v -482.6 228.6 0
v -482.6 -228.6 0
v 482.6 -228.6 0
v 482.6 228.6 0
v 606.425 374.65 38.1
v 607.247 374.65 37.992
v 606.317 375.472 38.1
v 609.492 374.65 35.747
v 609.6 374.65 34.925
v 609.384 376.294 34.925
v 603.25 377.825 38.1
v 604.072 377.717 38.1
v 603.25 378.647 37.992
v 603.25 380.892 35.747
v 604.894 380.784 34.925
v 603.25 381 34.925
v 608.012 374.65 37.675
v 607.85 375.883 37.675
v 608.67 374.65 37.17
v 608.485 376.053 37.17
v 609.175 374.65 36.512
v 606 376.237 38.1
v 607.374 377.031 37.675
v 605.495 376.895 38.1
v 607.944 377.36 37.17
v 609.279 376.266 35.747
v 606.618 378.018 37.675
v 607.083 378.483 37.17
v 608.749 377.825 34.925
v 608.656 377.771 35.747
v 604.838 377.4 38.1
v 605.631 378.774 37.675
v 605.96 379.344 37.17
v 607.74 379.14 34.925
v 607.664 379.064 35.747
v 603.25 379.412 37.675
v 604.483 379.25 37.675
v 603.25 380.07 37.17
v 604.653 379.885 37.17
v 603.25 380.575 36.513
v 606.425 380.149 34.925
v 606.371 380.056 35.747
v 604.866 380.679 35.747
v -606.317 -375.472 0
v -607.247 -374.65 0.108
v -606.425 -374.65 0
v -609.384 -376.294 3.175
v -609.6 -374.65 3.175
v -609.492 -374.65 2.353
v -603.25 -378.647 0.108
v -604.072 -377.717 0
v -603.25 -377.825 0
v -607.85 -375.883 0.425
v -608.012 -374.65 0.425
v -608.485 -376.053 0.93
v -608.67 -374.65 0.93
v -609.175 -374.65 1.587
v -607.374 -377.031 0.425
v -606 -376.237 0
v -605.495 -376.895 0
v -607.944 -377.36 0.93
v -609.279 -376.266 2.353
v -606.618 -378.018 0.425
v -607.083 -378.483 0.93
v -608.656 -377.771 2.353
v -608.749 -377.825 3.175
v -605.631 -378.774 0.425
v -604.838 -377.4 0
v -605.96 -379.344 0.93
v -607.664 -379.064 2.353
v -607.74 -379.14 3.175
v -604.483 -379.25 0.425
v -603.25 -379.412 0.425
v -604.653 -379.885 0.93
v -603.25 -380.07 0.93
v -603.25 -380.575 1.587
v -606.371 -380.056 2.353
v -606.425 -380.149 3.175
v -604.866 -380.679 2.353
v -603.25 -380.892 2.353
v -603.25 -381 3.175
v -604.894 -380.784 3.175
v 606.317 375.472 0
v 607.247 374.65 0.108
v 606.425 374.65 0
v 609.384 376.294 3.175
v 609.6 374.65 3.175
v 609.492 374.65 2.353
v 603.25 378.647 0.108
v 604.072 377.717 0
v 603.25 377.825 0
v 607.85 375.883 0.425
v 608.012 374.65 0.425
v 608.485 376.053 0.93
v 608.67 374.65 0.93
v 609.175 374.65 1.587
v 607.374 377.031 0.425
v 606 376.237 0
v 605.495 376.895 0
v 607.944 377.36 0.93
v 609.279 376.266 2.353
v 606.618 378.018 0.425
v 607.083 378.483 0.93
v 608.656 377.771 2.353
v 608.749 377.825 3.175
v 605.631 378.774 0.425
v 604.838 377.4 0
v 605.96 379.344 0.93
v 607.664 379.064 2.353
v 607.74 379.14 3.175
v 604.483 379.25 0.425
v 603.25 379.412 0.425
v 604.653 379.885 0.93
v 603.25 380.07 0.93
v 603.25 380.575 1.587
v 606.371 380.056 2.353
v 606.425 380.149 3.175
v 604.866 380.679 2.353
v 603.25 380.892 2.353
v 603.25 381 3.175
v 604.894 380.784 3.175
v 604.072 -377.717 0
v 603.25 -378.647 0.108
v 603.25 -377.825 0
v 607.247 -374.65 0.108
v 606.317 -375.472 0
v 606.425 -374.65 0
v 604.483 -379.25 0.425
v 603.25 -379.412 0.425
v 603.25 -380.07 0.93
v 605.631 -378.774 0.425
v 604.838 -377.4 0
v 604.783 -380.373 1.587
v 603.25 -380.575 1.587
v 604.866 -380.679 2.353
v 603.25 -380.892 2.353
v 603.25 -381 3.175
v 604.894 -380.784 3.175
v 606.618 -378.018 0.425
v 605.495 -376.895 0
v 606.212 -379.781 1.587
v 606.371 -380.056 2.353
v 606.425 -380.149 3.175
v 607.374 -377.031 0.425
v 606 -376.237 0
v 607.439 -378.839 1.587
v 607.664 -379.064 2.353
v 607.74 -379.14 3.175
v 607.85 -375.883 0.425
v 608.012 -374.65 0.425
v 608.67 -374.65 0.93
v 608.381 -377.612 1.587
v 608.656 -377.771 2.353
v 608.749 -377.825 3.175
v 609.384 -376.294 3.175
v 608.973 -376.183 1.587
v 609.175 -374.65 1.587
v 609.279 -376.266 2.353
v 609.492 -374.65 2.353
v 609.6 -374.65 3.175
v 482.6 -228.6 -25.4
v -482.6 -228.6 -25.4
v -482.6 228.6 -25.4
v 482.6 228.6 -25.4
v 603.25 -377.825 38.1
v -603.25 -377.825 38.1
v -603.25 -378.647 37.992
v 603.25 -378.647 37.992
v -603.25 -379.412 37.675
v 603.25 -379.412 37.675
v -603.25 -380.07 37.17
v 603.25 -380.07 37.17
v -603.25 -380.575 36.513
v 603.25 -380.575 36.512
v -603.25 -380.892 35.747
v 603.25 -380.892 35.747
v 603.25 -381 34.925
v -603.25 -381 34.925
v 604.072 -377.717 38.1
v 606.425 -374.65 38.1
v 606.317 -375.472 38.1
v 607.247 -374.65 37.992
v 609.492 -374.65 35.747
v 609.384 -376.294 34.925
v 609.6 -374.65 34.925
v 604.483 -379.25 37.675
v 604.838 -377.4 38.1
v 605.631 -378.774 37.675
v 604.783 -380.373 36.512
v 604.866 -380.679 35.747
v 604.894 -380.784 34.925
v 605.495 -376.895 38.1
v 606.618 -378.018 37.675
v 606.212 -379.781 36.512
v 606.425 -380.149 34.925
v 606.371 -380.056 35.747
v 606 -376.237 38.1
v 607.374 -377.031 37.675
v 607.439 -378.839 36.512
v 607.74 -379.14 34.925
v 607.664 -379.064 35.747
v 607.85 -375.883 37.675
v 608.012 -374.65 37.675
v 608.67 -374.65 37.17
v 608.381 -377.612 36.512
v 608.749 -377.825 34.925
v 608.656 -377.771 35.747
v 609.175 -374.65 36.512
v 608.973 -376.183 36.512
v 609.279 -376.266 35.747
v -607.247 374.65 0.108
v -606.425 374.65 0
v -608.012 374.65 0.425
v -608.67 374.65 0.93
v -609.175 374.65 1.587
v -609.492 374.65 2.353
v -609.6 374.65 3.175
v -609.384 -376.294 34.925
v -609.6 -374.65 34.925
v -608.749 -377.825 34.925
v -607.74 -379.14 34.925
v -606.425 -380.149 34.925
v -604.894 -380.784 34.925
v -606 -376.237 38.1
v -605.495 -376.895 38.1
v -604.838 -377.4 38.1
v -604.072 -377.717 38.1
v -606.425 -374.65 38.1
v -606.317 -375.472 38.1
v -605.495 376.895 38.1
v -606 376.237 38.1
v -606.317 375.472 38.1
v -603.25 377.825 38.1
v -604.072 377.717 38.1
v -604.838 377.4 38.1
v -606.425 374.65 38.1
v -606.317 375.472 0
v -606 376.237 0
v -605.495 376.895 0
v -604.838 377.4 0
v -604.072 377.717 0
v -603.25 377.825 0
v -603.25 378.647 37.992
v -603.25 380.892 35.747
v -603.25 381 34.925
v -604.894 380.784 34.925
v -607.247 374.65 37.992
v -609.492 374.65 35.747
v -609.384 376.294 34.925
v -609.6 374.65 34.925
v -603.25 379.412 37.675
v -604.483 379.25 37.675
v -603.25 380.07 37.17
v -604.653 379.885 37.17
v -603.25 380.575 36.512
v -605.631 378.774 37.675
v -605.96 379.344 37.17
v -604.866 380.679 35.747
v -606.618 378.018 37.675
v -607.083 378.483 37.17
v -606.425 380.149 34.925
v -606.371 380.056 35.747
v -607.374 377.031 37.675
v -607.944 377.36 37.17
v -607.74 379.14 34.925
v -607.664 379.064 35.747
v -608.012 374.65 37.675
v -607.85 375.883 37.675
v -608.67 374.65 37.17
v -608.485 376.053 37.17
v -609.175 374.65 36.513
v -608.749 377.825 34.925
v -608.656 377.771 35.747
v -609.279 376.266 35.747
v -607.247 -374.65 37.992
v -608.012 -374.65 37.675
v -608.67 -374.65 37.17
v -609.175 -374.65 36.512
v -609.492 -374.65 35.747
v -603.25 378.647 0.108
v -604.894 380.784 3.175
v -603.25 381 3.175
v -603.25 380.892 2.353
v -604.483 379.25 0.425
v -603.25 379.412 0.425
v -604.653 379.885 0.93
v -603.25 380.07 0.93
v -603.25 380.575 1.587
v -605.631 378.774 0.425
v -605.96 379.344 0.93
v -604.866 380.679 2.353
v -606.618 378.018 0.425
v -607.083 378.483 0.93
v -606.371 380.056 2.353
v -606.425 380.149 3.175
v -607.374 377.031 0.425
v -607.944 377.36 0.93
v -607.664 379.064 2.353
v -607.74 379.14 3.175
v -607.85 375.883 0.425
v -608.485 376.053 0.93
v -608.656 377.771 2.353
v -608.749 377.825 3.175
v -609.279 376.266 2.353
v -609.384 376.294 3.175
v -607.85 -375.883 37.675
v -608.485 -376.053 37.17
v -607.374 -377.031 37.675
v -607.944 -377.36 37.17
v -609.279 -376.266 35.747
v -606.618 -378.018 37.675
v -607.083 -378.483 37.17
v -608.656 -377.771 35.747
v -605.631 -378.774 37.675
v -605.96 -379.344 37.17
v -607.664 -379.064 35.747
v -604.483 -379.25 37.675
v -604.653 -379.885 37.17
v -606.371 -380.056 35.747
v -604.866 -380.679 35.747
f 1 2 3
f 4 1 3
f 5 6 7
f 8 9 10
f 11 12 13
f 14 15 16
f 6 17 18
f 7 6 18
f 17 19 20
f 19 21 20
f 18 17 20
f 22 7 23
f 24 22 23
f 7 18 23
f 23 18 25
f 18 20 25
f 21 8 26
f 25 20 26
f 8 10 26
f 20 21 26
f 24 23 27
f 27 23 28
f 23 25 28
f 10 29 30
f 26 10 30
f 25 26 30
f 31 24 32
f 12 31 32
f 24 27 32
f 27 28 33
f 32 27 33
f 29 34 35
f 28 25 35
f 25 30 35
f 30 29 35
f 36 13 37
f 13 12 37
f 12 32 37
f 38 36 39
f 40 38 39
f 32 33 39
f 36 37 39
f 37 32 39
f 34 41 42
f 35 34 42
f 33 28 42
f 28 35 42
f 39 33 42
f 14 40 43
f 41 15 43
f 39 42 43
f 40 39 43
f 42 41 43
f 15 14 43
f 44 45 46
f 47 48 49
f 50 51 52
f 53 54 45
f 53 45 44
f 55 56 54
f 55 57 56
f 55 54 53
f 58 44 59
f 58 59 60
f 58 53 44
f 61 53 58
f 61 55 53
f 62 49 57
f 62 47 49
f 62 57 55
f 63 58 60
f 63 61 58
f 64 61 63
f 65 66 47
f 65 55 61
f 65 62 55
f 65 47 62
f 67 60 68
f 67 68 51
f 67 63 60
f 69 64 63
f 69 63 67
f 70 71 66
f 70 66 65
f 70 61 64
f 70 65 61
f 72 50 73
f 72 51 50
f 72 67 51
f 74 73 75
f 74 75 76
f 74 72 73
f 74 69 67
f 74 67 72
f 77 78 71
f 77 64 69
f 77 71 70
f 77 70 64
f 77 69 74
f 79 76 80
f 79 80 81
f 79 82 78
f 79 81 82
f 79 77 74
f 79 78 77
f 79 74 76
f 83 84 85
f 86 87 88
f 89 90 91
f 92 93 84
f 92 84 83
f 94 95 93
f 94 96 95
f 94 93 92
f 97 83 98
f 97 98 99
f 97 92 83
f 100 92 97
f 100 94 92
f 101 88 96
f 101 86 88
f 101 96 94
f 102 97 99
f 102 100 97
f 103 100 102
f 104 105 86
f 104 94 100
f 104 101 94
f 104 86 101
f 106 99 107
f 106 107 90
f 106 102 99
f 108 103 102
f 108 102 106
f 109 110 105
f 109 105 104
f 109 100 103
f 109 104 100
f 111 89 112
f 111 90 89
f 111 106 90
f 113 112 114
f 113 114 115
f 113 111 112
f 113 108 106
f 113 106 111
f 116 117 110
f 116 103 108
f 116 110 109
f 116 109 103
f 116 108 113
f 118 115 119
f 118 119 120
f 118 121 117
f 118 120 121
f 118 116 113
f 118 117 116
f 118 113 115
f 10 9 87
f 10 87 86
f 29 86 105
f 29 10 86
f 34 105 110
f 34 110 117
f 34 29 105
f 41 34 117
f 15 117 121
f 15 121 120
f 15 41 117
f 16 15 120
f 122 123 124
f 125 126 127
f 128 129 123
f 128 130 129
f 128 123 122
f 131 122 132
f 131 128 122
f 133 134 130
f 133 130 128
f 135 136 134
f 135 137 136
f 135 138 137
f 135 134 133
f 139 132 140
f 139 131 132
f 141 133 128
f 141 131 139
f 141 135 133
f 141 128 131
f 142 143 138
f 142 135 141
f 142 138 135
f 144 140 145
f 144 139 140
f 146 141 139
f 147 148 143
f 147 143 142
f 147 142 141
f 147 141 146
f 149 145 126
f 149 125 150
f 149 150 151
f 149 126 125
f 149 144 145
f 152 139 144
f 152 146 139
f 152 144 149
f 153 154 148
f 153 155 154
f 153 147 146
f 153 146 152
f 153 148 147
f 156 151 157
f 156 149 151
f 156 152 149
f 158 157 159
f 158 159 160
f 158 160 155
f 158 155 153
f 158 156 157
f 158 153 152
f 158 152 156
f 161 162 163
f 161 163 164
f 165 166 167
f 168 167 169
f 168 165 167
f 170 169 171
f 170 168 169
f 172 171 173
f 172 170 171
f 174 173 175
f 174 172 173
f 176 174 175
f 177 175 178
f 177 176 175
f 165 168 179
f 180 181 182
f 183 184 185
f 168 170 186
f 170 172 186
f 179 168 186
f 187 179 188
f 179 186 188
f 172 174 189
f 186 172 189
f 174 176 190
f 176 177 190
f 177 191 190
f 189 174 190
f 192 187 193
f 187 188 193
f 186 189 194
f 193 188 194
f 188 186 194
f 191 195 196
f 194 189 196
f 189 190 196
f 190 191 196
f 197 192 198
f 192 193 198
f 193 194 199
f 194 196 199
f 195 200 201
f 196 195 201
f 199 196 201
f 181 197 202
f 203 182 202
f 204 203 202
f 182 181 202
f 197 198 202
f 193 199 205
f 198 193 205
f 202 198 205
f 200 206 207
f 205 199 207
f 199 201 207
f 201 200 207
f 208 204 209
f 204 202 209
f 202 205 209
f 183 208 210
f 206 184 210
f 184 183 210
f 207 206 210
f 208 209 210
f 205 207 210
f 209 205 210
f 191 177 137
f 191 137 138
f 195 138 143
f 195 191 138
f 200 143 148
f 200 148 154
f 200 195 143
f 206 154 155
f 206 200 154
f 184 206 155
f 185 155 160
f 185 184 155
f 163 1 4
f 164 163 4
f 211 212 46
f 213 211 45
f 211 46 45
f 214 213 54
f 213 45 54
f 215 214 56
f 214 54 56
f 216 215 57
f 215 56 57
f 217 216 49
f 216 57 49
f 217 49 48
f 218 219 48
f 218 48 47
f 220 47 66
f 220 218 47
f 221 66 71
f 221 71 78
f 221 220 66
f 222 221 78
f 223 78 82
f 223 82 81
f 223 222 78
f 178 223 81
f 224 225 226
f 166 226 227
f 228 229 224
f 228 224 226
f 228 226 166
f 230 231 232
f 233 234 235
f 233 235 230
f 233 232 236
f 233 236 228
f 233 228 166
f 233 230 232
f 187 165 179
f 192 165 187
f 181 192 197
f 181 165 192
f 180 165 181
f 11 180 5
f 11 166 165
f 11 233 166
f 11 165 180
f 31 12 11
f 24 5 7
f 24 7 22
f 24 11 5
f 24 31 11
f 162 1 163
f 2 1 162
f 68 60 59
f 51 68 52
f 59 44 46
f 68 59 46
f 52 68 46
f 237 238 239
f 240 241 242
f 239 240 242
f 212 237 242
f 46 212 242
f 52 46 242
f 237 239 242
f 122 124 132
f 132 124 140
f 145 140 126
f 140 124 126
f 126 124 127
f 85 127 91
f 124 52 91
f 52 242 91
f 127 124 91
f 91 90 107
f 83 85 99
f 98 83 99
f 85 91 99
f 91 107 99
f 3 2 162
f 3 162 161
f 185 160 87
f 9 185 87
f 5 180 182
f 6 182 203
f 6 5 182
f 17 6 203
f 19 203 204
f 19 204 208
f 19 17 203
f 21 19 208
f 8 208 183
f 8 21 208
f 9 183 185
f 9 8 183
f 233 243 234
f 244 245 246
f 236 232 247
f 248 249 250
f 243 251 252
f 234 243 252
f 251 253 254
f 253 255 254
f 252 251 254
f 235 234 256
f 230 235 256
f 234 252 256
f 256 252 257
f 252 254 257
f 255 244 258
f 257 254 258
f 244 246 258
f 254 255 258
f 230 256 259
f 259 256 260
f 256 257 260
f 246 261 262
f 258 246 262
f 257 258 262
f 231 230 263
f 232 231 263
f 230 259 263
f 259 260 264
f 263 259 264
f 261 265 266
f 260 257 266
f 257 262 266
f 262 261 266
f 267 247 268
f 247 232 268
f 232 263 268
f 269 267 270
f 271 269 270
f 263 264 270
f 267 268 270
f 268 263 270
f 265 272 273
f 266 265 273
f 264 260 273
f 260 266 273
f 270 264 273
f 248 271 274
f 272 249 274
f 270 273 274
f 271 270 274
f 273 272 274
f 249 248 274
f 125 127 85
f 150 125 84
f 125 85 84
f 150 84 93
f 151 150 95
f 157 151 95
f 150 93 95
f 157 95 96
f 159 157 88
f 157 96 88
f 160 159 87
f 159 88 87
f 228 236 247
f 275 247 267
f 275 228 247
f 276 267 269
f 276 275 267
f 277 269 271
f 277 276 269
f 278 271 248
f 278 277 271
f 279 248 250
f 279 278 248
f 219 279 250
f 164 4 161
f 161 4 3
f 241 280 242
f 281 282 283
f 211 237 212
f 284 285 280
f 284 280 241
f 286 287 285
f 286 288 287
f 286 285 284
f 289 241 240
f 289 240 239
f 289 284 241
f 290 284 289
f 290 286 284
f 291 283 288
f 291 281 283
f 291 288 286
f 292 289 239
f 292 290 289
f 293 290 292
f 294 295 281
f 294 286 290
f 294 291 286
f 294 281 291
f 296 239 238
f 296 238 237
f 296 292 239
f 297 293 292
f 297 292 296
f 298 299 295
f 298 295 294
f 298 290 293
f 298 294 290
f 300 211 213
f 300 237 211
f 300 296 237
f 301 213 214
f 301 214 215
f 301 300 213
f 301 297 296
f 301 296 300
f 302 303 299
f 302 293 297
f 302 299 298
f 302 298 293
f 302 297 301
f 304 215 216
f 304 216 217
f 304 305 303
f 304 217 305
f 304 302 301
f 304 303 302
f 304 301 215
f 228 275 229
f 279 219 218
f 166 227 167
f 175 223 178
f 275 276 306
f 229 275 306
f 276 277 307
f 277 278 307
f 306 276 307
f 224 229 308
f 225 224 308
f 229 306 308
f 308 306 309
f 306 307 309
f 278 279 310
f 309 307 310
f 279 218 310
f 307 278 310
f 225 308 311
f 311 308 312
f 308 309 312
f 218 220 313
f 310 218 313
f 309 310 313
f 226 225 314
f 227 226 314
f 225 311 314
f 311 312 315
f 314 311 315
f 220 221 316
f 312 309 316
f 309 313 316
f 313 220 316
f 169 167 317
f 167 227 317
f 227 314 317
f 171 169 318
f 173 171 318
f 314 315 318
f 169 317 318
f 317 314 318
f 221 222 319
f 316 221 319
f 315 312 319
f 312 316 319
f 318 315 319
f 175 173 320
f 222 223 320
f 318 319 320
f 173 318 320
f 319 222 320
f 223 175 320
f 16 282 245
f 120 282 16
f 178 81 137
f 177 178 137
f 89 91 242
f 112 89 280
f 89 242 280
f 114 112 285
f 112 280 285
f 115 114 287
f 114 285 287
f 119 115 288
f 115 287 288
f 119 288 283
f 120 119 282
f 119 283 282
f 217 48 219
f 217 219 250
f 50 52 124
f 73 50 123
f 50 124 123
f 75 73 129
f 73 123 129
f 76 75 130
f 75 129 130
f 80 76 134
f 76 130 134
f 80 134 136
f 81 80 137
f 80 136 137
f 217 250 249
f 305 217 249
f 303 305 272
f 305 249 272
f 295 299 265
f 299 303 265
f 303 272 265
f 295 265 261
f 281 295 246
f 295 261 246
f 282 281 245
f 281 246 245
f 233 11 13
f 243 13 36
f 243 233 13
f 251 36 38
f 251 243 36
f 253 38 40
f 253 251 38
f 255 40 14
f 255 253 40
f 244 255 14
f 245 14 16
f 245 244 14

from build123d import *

# Parameters (mm, degrees)
F0_W     = 1219.2
F0_H     = 762
F1_DEPTH = 38.1
F2_R     = 6.35
F3_R     = 3.175
F4_W     = 965.2
F4_H     = 457.2
F5_DEPTH = 25.4


with BuildPart() as f1:
    # F0 (on Top) → F1 (new body)
    with BuildSketch(Plane.XY):
        Rectangle(F0_W, F0_H)
    extrude(amount=F1_DEPTH)

    # F2
    f2_edges = [f1.edges().sort_by_distance(p)[0] for p in [
        (-609.6, -381, 19.05),
        (609.6, -381, 19.05),
        (-609.6, 381, 19.05),
        (609.6, 381, 19.05),
    ]]
    fillet(f2_edges, radius=F2_R)

    # F3
    f3_edges = [f1.edges().sort_by_distance(p)[0] for p in [
        (609.6, 0, 38.1),
        (609.6, 0, 0),
    ]]
    fillet(f3_edges, radius=F3_R)


with BuildPart() as f5:
    # F4 (on face) → F5 (new body)
    with BuildSketch(Plane(origin=(0, 0, 0), x_dir=(1, 0, 0), z_dir=(0, 0, -1))):
        Rectangle(F4_W, F4_H)
    extrude(amount=F5_DEPTH)


solid = Compound([f1.part, f5.part])
